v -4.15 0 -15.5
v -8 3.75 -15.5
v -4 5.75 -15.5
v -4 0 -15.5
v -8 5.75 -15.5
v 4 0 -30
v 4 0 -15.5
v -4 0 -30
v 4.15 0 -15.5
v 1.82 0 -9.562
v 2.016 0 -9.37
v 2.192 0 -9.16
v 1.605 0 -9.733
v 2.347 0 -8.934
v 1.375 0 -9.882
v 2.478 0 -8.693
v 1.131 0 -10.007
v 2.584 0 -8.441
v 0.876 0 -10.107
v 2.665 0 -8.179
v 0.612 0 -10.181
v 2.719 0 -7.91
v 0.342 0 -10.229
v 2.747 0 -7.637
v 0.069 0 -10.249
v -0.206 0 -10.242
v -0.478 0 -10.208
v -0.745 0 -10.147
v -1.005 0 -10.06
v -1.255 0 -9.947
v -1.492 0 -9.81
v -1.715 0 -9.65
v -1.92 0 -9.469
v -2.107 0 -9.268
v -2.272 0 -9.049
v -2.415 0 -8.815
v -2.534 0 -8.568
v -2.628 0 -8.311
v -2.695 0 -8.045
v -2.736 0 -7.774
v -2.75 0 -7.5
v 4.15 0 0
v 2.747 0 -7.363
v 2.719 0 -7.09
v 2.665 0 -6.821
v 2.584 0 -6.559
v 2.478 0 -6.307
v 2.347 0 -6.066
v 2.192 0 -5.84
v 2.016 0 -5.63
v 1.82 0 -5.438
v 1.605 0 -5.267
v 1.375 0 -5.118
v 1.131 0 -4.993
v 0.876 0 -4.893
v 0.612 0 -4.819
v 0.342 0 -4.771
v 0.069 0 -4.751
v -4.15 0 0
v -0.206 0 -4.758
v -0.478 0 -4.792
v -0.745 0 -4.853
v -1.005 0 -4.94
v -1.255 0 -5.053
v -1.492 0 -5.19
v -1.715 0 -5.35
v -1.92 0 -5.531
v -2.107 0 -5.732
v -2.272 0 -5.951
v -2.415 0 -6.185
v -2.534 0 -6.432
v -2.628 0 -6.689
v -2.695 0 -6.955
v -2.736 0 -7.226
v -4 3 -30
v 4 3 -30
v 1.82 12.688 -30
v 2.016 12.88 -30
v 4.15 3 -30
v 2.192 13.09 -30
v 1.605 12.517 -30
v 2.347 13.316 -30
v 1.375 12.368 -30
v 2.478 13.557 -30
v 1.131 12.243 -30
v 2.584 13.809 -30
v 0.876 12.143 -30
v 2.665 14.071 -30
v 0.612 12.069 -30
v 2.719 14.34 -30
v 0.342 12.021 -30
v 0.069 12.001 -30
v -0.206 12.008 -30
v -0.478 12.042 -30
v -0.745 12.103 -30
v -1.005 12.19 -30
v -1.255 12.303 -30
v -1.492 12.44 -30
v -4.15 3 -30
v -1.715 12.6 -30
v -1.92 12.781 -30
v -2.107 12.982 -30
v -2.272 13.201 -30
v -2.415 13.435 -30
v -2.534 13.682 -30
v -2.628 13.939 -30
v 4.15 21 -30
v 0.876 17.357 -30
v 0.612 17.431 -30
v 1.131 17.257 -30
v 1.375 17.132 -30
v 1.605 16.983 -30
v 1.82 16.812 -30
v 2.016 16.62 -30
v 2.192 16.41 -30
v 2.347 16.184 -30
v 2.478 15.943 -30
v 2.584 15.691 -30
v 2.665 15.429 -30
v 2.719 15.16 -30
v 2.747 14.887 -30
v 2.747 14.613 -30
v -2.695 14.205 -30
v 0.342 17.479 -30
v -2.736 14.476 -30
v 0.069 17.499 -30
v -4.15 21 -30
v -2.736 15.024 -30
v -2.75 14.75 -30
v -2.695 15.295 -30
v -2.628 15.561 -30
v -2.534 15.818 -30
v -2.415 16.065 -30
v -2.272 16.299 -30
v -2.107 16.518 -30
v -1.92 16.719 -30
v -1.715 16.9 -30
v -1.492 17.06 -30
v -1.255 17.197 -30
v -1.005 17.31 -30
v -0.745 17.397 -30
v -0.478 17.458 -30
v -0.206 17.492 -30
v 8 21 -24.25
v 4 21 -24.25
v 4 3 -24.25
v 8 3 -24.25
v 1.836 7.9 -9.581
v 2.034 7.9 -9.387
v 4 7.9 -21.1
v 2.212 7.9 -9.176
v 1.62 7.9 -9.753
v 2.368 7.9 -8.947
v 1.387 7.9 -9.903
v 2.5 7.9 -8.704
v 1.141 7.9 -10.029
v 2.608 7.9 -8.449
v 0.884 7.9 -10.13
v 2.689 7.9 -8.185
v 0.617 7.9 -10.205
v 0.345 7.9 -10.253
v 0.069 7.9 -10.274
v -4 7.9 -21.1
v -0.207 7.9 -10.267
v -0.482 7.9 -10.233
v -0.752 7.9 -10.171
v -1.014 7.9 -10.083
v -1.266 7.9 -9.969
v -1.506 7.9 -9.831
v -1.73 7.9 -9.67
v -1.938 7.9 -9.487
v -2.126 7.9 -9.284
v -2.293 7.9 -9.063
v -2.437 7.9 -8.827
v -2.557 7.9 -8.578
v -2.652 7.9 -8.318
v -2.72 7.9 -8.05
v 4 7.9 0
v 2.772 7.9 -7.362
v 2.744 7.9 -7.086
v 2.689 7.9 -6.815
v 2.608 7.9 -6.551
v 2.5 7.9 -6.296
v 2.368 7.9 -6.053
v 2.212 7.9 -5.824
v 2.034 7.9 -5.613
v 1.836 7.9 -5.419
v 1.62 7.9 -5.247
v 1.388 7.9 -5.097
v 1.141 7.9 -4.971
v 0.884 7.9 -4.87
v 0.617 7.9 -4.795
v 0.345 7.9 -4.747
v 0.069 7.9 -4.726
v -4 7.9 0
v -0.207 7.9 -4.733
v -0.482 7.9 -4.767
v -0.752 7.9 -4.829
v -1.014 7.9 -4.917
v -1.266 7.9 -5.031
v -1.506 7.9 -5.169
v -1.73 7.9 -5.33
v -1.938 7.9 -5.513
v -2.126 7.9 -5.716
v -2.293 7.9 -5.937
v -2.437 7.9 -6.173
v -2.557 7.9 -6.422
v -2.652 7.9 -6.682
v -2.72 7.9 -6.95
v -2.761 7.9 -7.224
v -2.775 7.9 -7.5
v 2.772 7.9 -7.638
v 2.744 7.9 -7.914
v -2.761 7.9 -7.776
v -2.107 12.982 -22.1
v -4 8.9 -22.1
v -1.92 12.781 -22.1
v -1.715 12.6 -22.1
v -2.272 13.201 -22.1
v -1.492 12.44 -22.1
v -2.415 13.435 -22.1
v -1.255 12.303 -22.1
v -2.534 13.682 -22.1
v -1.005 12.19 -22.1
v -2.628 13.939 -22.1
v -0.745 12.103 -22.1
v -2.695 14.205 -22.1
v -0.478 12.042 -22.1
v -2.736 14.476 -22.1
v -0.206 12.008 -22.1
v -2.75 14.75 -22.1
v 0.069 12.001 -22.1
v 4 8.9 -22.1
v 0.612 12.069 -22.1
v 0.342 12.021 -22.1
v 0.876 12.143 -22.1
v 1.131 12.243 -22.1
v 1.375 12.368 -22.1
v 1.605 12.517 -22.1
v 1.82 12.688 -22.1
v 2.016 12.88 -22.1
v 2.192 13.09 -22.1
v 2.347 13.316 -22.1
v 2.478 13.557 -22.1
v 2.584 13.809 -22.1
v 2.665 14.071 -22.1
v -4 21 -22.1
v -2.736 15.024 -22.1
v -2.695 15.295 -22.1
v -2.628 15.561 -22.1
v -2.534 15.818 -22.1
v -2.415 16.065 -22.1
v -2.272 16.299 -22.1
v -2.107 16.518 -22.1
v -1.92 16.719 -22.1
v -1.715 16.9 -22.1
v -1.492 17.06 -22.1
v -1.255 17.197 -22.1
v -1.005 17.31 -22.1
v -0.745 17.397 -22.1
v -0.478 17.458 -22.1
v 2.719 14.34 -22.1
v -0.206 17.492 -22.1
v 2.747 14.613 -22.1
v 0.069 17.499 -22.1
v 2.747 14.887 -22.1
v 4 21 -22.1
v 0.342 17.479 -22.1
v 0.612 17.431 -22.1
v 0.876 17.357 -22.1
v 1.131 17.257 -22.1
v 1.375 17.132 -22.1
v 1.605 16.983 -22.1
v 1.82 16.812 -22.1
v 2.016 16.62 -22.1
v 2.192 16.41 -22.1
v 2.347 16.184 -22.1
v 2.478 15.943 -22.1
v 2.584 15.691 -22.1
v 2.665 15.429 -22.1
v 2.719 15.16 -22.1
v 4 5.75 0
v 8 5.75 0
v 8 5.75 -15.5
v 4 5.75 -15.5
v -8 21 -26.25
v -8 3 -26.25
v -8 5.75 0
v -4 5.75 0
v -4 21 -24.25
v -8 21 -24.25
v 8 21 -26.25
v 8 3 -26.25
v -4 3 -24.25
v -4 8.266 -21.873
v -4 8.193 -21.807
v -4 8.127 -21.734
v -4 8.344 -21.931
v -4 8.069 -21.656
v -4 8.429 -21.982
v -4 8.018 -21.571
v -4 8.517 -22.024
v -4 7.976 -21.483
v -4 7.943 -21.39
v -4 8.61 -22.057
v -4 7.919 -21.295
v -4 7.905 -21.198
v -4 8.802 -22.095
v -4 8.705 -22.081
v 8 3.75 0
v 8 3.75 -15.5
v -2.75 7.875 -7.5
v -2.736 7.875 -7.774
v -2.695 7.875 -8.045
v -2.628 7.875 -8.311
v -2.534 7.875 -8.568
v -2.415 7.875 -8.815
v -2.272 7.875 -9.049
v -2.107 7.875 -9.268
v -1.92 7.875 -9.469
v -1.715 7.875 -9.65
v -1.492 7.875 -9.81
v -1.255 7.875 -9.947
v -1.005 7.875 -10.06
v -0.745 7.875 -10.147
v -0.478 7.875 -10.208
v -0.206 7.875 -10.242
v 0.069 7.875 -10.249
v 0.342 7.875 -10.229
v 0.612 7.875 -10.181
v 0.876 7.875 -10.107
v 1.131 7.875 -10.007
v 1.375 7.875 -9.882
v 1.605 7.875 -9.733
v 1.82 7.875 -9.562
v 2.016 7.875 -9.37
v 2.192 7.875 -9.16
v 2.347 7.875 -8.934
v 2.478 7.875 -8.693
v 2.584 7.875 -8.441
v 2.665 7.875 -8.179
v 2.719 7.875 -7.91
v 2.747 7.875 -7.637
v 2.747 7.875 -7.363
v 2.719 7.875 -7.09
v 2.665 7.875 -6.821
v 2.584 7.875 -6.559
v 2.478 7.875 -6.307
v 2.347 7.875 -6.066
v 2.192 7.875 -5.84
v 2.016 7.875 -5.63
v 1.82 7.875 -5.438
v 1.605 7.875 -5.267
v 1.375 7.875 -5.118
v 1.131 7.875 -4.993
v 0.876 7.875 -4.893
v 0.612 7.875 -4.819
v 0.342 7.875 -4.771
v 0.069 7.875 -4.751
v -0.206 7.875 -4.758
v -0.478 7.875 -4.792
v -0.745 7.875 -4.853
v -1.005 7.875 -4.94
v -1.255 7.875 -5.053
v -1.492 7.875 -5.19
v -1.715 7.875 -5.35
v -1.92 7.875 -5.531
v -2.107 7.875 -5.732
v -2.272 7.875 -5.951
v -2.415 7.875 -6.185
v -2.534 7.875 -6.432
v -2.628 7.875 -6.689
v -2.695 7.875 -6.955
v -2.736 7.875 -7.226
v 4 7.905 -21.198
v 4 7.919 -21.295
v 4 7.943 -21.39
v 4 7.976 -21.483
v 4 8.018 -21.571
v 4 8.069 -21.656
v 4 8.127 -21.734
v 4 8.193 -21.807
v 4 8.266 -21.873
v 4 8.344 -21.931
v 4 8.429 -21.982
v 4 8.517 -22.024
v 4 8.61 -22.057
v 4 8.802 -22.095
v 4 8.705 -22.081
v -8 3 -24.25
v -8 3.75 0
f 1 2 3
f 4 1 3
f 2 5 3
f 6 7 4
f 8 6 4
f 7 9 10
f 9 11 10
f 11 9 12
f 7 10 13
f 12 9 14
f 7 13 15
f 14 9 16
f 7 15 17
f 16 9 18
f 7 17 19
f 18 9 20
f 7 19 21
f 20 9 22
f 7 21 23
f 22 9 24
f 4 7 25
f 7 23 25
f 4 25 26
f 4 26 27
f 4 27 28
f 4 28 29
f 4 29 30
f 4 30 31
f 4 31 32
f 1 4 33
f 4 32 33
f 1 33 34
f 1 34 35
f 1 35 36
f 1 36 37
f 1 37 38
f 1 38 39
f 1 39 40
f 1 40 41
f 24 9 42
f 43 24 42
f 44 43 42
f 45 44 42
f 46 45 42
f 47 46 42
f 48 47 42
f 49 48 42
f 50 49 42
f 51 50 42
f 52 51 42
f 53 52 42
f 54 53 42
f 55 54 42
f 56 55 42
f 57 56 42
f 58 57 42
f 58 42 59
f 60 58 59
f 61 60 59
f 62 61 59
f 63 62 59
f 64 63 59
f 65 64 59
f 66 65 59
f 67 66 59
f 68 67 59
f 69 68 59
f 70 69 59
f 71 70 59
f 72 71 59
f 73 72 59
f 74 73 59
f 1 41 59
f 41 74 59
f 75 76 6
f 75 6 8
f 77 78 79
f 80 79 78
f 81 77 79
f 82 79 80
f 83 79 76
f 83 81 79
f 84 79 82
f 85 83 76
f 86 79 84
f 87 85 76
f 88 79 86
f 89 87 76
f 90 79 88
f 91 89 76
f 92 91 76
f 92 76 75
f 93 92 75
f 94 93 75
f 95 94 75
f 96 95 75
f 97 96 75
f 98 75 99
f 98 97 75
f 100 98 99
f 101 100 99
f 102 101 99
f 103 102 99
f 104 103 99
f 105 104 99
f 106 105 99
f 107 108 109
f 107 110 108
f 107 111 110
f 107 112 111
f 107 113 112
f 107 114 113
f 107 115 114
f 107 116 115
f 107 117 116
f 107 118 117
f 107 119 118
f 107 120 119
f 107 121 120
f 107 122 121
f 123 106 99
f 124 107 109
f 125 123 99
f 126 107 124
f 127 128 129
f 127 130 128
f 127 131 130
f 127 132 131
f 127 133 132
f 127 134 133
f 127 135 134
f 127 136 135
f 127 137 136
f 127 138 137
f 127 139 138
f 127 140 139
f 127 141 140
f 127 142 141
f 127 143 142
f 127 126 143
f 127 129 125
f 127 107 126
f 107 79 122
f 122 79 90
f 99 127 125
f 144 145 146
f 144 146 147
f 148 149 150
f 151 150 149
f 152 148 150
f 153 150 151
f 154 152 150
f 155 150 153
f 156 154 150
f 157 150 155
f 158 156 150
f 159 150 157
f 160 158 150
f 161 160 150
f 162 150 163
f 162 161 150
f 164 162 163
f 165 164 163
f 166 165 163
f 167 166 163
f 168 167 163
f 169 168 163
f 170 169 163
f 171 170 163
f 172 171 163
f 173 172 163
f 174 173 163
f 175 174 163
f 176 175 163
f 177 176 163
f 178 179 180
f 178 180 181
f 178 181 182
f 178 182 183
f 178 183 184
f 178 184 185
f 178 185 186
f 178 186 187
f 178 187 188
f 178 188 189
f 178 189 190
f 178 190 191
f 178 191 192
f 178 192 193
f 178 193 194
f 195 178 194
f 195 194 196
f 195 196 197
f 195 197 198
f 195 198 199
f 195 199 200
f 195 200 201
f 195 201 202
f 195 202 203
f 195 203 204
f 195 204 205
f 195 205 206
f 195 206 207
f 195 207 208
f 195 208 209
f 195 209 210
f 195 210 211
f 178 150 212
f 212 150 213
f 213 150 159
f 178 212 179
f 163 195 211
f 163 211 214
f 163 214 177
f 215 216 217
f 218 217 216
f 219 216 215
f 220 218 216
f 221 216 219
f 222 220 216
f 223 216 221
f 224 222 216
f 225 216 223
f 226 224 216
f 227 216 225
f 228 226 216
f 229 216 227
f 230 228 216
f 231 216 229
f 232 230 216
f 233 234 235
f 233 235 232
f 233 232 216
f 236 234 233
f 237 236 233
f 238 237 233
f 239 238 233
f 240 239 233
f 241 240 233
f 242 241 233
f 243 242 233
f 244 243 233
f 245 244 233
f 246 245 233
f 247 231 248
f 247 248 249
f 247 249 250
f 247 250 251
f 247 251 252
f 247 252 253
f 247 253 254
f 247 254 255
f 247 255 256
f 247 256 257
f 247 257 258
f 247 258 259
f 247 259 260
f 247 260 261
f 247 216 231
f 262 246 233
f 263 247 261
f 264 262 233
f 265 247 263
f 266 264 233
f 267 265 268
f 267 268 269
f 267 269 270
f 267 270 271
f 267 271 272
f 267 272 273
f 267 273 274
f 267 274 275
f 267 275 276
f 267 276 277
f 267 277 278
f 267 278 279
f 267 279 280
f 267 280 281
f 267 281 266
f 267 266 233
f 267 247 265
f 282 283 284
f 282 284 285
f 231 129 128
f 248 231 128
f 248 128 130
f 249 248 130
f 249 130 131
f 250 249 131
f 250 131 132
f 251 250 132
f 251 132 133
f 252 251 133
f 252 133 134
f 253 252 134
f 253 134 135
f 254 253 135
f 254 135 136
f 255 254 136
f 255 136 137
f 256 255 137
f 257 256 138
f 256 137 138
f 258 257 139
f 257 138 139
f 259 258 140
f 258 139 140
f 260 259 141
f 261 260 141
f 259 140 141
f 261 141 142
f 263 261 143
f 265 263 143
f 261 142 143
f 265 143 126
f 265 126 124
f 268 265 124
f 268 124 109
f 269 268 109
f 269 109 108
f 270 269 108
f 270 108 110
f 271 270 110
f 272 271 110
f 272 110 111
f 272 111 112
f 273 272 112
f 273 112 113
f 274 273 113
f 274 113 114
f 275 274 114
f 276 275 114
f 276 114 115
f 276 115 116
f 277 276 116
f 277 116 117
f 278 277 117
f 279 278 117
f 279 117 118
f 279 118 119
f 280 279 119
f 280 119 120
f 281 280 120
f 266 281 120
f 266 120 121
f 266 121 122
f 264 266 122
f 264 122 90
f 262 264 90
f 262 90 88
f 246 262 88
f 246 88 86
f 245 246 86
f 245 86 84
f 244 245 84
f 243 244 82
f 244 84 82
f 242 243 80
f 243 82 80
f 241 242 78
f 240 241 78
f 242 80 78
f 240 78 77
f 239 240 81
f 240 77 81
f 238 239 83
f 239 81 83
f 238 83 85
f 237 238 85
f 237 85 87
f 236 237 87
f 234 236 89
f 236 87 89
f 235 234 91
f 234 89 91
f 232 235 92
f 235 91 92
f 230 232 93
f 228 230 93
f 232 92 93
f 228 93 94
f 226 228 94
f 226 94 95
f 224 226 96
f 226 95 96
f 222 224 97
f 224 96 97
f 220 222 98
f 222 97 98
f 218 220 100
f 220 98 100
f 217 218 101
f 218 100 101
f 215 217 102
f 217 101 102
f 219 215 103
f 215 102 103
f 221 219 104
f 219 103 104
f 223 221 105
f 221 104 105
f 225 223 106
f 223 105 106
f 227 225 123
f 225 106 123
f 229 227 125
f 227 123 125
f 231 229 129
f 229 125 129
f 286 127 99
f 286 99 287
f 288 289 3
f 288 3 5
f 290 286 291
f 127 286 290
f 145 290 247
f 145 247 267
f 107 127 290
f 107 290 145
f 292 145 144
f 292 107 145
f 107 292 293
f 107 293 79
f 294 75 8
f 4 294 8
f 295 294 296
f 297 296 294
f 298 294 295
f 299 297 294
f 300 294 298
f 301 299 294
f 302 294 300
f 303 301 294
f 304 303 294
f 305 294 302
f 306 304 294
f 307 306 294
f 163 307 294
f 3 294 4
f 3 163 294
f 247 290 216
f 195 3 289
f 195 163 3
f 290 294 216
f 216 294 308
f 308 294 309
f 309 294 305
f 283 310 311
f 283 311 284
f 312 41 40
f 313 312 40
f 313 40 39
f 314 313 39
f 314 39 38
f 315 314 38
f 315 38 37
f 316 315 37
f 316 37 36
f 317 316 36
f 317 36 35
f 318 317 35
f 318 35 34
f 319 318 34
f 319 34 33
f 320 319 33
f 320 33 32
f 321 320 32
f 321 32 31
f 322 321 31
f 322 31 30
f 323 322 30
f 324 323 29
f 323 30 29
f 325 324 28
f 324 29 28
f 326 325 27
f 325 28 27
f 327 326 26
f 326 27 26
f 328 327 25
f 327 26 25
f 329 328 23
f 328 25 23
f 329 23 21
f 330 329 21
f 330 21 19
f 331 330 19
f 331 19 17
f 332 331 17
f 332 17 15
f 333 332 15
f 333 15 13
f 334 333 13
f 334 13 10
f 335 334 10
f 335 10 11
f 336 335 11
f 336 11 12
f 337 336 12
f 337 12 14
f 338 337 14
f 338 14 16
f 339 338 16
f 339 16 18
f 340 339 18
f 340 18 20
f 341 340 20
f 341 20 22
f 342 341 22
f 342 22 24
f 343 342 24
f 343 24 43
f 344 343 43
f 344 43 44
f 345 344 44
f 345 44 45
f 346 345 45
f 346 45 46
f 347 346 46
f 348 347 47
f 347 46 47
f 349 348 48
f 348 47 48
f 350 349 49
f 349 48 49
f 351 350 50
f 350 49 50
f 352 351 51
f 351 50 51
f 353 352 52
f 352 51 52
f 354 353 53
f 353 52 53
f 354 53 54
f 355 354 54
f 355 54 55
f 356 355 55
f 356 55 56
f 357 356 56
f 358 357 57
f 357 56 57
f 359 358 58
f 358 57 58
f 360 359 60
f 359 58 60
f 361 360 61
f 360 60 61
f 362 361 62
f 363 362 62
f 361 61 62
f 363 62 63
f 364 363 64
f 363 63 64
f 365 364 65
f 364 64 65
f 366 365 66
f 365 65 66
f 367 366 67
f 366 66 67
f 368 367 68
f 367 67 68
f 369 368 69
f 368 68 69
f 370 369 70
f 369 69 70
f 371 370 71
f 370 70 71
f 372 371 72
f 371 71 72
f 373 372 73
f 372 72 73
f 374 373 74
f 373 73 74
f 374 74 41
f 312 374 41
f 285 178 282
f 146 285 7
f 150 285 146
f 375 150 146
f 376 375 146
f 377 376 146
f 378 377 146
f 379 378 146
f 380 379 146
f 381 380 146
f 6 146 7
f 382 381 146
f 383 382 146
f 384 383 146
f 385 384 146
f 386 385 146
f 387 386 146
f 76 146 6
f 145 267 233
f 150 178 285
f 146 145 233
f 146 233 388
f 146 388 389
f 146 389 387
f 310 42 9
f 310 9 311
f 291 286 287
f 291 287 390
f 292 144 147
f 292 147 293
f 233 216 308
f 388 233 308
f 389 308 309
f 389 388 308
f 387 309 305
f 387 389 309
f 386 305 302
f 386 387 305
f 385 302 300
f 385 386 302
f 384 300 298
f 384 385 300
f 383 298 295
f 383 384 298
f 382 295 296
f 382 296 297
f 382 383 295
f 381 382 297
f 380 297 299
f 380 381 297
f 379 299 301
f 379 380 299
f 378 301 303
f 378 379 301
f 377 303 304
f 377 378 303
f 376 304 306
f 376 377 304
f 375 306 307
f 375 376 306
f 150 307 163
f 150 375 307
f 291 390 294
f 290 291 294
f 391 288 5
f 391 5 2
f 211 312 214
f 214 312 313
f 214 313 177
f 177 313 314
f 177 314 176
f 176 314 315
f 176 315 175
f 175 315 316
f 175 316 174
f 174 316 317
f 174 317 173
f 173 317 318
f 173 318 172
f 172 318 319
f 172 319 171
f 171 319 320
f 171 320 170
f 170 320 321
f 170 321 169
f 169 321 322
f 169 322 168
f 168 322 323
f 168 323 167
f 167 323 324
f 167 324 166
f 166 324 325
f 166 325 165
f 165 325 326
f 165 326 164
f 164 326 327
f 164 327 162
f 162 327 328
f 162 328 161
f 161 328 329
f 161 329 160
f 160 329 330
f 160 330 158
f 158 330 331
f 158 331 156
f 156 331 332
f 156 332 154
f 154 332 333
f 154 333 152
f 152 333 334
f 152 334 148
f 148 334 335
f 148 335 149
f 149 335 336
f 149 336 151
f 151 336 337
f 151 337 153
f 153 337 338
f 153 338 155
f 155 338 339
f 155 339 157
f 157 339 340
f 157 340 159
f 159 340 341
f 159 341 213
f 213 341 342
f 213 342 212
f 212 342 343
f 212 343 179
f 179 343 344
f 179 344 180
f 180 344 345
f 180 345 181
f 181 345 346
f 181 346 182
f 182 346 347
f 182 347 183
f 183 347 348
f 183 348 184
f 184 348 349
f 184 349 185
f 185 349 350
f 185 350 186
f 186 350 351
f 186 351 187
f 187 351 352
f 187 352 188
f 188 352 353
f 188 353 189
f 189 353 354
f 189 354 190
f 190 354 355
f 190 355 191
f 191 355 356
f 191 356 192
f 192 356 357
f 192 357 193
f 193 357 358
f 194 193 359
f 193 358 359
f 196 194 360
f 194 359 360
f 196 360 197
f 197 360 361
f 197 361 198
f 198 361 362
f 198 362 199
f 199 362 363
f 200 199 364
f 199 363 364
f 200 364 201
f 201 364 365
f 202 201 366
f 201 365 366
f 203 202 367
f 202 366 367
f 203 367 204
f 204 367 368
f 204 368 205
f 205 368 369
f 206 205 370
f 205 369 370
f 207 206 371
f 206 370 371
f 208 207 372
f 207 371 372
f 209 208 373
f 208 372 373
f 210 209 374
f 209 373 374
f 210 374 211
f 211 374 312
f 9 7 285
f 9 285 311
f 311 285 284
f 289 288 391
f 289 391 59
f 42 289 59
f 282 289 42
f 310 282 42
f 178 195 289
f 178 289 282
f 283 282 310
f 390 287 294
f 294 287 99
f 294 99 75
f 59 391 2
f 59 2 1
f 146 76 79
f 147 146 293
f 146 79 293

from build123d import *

# Parameters (mm, degrees)
ESTRUSIONE_ESTRUSIONE1_DEPTH   = 15.5
SCHIZZO2_W                     = 8
SCHIZZO2_H                     = 7.9
ESTRUSIONE_ESTRUSIONE2_DEPTH   = 14.5
ESTRUSIONE_ESTRUSIONE3_DEPTH   = 18
RACCORDO1_R                    = 1
FORO_PER_VITE_M5_1_D           = 5.5
FORO_PER_VITE_M5_1_DEPTH       = 7.9
FORO_PER_VITE_M5_1_CSINK_D     = 5.55
FORO_PER_VITE_M5_1_CSINK_ANGLE = 90
FORO_PER_VITE_M5_2_D           = 5.5


with BuildPart() as part:
    # Schizzo1 → Estrusione-Estrusione1 (new body)
    with BuildSketch(Plane.XY):
        Polygon((-4.15, 0), (4.15, 0), (8, 3.75), (8, 5.75), (4, 5.75), (4, 7.9), (-4, 7.9), (-4, 5.75), (-8, 5.75), (-8, 3.75), align=None)
    extrude(amount=-ESTRUSIONE_ESTRUSIONE1_DEPTH)

    # Schizzo2 → Estrusione-Estrusione2 (add)
    with BuildSketch(Plane(origin=(0, 0, -15.5), x_dir=(-1, 0, 0), z_dir=(0, 0, -1))):
        with Locations((0, 3.95)):
            Rectangle(SCHIZZO2_W, SCHIZZO2_H)
    extrude(amount=ESTRUSIONE_ESTRUSIONE2_DEPTH)

    # Schizzo4 → Estrusione-Estrusione3 (add)
    with BuildSketch(Plane(origin=(0, 21, 0), x_dir=(-1, 0, 0), z_dir=(0, -1, 0))):
        Polygon((-4.15, 30), (4.15, 30), (8, 26.25), (8, 24.25), (4, 24.25), (4, 22.1), (-4, 22.1), (-4, 24.25), (-8, 24.25), (-8, 26.25), align=None)
    extrude(amount=ESTRUSIONE_ESTRUSIONE3_DEPTH)

    # Raccordo1
    raccordo1_edges = [part.edges().sort_by_distance(p)[0] for p in [
        (0, 7.9, -22.1),
    ]]
    fillet(raccordo1_edges, radius=RACCORDO1_R)

    # Foro per Vite M5-1
    with Locations(Plane(origin=(0, 7.9, 0), x_dir=(1, 0, 0), z_dir=(0, 1, 0))):
        with Locations((0, 7.5)):
            CounterSinkHole(FORO_PER_VITE_M5_1_D / 2, FORO_PER_VITE_M5_1_CSINK_D / 2, depth=FORO_PER_VITE_M5_1_DEPTH, counter_sink_angle=FORO_PER_VITE_M5_1_CSINK_ANGLE)

    # Foro per Vite M5-2 (through all)
    with Locations(Plane.XY.offset(-22.1)):
        with Locations((0, 14.75)):
            Hole(FORO_PER_VITE_M5_2_D / 2)


solid = part.part
